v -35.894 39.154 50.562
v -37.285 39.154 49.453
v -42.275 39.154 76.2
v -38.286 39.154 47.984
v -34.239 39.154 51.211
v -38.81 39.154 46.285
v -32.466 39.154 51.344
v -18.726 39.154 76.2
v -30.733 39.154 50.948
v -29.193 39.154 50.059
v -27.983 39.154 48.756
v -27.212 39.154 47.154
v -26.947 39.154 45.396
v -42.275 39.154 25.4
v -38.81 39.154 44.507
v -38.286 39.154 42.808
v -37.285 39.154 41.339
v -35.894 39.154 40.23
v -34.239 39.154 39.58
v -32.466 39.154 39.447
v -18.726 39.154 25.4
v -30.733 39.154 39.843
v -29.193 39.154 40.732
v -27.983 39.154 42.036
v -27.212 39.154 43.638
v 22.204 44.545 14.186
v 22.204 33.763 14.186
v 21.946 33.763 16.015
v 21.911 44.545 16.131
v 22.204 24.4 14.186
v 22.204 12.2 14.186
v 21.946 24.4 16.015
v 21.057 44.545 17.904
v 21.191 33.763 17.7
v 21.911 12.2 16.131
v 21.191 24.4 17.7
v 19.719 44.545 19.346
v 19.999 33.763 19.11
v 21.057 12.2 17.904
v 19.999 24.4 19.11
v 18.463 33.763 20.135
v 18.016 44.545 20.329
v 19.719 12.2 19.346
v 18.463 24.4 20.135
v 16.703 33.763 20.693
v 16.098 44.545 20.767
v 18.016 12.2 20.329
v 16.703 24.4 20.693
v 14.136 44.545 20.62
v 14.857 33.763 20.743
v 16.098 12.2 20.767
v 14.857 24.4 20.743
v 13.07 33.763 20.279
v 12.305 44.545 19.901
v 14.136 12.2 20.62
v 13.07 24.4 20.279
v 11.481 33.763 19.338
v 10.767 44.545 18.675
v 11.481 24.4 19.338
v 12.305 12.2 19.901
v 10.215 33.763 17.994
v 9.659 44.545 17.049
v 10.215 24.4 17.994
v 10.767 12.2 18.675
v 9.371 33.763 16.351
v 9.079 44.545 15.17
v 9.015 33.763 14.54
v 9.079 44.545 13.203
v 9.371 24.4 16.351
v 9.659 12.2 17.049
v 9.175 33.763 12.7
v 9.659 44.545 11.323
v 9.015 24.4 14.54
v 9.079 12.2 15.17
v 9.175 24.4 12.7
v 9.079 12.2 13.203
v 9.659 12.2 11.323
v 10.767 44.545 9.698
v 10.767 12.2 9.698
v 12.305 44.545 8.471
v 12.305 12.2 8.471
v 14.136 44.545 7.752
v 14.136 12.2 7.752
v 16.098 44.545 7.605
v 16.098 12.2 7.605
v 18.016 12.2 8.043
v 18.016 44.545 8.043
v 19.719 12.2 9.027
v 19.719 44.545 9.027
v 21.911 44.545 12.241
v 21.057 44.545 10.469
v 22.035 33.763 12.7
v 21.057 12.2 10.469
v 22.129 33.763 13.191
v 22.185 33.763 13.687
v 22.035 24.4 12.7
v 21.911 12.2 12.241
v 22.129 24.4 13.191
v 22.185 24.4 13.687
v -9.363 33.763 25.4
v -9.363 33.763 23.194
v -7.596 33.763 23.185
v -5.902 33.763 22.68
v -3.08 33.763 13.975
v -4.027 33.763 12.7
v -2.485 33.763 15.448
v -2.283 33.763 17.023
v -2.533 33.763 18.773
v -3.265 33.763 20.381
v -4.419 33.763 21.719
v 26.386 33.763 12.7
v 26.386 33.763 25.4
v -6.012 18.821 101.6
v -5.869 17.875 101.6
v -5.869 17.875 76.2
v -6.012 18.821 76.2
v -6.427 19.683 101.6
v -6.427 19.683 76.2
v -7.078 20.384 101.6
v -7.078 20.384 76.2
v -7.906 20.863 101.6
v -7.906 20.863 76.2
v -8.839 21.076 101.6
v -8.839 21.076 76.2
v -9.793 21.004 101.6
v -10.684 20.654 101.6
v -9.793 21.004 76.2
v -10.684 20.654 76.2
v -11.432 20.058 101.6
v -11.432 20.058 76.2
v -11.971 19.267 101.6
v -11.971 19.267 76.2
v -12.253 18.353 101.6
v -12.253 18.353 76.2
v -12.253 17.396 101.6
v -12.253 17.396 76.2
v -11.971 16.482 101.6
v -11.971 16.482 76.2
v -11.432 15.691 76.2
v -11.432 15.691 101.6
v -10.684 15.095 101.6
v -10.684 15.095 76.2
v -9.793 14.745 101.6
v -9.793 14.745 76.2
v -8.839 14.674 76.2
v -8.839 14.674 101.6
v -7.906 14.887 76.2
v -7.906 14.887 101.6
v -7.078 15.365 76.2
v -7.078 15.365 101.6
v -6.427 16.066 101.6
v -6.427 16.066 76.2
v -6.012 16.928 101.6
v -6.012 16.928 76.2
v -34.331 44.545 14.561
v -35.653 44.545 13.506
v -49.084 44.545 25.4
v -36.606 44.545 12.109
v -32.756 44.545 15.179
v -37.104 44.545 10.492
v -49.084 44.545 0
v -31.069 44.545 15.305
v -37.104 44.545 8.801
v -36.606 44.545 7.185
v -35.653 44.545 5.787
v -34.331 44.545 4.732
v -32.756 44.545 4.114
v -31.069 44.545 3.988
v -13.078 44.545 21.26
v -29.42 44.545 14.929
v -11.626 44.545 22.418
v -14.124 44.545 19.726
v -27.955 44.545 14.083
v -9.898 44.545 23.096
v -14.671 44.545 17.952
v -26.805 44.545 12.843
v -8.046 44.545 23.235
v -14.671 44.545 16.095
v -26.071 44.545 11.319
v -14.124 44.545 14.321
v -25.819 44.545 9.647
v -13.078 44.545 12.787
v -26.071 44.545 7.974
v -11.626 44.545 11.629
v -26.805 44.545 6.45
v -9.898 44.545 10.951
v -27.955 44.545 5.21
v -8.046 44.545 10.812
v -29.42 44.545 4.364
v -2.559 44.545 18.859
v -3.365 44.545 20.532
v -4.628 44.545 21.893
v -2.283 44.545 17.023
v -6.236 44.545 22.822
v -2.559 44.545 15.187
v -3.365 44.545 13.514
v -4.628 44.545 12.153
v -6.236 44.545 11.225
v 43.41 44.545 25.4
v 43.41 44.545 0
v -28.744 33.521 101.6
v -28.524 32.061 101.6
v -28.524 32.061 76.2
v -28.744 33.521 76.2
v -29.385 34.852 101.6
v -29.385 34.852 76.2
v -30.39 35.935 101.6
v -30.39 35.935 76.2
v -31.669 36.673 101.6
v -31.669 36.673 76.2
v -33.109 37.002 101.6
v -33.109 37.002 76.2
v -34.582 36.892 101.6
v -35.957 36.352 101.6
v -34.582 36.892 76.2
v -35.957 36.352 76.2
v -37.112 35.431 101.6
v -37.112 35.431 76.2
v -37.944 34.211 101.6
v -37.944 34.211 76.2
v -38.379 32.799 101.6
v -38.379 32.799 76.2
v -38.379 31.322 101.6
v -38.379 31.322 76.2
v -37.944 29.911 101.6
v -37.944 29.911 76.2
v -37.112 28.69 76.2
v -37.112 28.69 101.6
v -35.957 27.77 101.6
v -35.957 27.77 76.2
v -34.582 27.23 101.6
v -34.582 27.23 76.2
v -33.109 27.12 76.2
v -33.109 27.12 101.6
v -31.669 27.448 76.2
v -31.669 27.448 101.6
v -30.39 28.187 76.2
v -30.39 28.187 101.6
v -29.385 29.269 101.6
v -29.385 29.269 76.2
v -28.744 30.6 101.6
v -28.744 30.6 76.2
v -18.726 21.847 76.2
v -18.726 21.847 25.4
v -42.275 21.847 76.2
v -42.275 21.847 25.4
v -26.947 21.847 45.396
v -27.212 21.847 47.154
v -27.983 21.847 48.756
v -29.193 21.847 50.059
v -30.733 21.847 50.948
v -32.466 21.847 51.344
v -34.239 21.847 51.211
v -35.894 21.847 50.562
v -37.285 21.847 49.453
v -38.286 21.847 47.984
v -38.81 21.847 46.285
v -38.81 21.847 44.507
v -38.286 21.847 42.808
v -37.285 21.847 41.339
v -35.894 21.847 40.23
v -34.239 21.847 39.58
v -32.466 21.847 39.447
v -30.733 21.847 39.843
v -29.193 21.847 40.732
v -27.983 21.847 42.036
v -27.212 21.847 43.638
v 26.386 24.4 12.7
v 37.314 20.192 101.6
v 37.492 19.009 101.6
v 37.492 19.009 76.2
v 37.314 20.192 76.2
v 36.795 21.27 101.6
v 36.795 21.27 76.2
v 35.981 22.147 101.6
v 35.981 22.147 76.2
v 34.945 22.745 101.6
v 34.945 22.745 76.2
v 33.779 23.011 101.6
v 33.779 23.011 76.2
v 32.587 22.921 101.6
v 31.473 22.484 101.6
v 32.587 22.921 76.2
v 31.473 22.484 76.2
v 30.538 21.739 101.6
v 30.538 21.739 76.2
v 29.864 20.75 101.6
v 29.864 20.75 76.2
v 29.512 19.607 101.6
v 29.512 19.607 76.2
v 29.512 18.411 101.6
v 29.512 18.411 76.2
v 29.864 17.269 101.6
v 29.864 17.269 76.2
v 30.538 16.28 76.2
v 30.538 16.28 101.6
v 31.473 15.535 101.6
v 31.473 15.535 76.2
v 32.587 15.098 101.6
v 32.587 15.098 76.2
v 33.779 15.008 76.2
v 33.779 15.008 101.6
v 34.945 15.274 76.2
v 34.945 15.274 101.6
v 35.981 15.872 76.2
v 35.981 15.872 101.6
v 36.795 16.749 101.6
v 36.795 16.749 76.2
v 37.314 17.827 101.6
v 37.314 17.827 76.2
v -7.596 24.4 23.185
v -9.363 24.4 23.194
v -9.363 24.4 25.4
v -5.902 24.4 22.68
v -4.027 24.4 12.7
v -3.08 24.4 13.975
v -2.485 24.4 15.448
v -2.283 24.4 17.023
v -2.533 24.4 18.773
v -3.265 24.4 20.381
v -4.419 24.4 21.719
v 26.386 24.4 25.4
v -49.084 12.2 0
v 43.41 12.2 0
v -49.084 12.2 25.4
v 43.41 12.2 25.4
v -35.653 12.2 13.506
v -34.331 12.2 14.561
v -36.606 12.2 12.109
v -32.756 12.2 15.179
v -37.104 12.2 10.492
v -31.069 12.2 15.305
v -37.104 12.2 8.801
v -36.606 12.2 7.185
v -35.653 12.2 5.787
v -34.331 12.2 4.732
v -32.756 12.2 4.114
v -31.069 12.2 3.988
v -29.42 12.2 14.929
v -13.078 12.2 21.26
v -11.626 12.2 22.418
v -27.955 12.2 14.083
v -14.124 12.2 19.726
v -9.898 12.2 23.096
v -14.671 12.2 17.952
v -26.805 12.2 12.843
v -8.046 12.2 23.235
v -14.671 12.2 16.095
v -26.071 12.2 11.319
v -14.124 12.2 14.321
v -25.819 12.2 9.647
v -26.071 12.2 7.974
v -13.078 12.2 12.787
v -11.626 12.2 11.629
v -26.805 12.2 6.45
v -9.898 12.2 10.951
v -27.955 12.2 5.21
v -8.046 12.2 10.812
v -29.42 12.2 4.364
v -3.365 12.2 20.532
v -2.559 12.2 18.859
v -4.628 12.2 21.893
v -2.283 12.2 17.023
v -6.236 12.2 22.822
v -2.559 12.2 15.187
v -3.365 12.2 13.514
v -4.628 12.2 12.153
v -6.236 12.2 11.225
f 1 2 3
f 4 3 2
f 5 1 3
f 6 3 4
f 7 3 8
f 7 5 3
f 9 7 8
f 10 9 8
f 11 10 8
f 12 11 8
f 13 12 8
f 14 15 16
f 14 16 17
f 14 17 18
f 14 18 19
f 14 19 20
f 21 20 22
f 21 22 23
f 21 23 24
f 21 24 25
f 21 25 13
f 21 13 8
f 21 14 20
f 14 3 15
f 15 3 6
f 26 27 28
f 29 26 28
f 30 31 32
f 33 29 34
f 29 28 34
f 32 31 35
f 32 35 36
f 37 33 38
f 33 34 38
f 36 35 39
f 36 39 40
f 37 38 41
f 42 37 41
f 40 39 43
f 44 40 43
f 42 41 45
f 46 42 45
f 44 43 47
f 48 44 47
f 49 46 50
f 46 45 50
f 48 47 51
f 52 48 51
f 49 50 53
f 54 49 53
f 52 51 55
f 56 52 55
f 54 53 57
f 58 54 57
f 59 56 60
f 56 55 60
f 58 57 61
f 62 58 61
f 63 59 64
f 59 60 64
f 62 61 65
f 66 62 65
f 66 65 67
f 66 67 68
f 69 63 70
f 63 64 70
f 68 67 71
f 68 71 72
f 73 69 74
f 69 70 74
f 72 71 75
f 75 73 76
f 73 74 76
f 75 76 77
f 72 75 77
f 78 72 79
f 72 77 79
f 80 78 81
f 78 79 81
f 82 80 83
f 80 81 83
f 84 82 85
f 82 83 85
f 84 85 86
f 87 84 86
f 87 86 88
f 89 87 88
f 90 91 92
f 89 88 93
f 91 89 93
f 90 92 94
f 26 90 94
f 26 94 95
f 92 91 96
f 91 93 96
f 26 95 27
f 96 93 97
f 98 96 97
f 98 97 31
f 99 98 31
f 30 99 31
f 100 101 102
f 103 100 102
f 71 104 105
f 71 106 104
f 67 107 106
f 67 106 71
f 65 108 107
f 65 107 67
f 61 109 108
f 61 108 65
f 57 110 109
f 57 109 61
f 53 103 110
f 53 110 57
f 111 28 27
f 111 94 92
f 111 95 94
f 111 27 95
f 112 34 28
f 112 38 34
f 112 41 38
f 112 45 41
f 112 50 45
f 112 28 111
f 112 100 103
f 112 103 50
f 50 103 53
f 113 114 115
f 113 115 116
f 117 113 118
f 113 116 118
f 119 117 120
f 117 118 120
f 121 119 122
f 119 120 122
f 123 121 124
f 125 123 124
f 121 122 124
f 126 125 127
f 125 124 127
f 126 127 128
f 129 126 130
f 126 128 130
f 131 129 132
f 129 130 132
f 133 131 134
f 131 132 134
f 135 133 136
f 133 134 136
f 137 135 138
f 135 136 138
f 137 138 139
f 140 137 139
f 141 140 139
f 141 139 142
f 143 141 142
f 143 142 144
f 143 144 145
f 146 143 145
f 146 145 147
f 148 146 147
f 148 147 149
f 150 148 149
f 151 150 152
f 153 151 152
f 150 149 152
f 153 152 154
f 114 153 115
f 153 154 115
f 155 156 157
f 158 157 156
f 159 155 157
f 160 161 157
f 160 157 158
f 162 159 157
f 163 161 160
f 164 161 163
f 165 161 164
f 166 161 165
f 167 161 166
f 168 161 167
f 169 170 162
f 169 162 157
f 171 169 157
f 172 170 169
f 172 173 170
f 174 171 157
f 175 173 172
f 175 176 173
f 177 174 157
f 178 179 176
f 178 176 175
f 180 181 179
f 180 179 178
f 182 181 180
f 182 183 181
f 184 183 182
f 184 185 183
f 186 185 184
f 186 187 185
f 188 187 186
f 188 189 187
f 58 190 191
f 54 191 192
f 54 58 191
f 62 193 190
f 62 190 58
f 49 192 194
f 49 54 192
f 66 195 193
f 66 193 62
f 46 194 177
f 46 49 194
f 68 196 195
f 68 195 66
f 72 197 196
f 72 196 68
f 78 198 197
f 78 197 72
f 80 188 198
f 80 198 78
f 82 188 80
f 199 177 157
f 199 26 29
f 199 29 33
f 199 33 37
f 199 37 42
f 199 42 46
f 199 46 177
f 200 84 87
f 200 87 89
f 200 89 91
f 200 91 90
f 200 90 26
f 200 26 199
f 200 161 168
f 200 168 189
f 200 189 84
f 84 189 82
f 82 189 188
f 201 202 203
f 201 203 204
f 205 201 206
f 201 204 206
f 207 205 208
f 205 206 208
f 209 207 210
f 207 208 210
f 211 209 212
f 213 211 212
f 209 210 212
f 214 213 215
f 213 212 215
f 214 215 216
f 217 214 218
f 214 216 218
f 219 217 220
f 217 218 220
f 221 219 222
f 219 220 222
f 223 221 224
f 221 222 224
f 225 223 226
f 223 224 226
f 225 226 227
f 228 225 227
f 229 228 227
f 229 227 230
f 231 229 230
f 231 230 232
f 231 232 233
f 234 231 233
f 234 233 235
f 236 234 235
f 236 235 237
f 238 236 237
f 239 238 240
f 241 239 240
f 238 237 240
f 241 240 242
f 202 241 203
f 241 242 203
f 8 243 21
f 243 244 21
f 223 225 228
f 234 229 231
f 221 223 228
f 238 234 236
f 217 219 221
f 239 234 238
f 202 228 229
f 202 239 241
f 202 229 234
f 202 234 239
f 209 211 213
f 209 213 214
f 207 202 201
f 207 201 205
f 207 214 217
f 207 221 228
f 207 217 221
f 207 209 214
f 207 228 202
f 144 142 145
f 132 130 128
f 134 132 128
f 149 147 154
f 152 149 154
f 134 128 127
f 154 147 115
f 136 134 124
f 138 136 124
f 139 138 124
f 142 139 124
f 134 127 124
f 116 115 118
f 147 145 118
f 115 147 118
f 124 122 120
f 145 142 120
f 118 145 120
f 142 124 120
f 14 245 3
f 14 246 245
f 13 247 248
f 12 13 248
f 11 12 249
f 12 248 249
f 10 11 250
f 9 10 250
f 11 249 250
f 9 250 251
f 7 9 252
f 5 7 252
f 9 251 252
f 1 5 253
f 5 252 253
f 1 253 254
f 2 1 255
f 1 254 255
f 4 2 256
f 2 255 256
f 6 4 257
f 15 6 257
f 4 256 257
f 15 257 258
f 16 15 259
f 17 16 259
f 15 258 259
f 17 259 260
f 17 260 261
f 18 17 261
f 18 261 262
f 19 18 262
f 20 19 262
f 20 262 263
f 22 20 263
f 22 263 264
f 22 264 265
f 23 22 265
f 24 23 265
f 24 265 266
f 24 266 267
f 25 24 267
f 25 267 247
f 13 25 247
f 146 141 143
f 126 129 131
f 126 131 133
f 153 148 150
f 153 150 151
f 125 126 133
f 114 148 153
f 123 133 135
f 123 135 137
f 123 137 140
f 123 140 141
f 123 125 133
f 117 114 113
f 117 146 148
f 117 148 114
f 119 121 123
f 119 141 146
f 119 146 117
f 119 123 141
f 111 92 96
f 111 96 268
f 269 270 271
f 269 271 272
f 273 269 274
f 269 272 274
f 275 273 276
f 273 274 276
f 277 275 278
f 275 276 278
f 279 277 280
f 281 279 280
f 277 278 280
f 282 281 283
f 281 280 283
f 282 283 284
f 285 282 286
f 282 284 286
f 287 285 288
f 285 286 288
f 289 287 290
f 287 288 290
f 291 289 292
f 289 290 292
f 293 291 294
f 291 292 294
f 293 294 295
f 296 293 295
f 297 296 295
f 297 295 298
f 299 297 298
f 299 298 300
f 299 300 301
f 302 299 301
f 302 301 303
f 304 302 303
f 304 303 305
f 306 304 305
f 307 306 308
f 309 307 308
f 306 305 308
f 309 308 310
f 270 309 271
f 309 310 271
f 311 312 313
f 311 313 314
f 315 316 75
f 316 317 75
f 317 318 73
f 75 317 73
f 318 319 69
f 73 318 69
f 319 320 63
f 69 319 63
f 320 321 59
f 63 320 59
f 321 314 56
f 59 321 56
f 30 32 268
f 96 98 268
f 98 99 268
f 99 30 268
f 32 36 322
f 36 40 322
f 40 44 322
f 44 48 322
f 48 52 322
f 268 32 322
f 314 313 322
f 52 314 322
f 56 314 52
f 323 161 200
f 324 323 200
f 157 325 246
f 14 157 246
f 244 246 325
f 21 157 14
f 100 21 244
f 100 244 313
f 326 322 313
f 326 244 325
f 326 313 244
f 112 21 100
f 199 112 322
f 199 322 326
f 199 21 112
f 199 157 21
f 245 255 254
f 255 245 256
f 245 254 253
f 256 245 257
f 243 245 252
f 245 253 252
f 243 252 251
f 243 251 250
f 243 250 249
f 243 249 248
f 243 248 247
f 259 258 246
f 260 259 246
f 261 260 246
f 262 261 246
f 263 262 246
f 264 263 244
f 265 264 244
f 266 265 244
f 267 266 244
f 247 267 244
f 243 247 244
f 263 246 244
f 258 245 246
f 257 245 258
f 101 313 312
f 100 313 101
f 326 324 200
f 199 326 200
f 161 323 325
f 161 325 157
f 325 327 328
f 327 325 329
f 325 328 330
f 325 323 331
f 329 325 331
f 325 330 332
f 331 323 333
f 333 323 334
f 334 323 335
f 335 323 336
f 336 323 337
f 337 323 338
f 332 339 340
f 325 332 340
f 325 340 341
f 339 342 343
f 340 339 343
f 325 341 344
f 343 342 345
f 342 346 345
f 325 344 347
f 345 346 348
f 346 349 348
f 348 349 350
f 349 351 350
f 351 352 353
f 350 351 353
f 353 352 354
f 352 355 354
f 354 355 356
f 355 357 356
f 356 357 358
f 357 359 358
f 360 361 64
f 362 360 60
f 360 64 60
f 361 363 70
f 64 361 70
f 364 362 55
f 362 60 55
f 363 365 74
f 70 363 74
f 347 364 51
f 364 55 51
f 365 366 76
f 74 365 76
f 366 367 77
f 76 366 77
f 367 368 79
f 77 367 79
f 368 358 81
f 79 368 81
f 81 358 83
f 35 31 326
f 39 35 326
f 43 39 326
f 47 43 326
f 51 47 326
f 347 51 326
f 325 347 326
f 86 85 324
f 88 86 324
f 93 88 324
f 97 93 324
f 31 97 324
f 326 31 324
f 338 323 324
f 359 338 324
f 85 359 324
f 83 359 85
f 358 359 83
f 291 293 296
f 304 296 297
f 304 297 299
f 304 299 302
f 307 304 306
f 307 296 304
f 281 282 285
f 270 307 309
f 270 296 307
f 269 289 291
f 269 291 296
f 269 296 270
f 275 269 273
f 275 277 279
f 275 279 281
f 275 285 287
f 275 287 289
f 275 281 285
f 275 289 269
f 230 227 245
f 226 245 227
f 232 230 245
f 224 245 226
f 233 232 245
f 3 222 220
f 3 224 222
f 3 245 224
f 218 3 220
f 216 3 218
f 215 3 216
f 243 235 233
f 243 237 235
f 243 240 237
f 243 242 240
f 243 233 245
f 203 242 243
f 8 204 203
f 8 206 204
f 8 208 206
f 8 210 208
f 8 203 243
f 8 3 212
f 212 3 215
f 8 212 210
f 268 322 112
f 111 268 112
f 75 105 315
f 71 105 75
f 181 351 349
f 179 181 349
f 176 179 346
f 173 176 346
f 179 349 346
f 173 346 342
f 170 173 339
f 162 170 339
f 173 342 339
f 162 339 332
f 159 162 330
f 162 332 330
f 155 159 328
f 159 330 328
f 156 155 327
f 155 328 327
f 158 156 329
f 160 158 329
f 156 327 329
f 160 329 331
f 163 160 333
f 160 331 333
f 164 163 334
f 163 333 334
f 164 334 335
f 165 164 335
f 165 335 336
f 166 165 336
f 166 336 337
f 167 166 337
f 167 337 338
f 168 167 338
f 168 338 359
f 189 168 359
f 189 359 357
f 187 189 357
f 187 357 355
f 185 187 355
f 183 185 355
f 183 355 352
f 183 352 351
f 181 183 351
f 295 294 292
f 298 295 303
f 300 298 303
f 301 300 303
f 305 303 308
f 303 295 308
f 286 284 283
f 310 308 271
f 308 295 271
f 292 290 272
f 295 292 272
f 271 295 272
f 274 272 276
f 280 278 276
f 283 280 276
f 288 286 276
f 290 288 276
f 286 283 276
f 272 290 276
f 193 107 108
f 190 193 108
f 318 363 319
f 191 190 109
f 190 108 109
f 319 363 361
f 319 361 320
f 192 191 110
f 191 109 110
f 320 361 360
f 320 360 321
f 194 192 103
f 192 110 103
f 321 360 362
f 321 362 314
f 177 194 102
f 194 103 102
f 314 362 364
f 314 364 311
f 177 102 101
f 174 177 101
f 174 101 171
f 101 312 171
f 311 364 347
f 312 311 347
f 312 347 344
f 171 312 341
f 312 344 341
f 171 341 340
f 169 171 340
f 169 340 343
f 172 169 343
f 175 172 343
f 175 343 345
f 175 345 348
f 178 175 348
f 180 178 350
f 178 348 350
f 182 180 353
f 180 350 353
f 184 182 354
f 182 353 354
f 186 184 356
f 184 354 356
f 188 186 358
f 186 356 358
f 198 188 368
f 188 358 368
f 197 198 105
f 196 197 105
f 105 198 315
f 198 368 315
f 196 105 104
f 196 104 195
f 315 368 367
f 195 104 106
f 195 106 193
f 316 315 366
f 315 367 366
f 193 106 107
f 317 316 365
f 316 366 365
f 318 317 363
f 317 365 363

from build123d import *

# Parameters (mm, degrees)
F0_W      = 92.4938283861
F0_H      = 32.3444707319
F1_DEPTH  = 25.4
F2_W      = 23.5490426421
F2_H      = 17.3071268946
F3_DEPTH  = 25.4
F4_DEPTH  = 25.4
F5_W      = 35.7491457835
F5_H      = 9.3628708273
F6_DEPTH  = 12.7
F7_R      = 6.2290064901
F8_DEPTH  = 32.3454707319
F9_R      = 5.9649434691
F9_R_2    = 5.6744676083
F9_R_3    = 6.5992382135
F10_DEPTH = 32.3454707319
F11_R     = 4.9550177223
F12_DEPTH = 25.4
F11_R_2   = 3.2099639101
F11_R_3   = 4.0124537352


with BuildPart() as f1:
    # F0 (on Top) → F1 (new body)
    with BuildSketch(Plane.XY):
        with Locations((-2.837235108, 28.3723422326)):
            Rectangle(F0_W, F0_H)
    extrude(amount=F1_DEPTH)

    # F2 (on face) → F3 (join)
    with BuildSketch(Plane.XY.offset(25.4)):
        with Locations((-30.500266701, 30.5002657697)):
            Rectangle(F2_W, F2_H)
    extrude(amount=F3_DEPTH)

    # F4 (add): a face of the model
    f4_faces = [f1.faces().sort_by_distance(p)[0] for p in [
        (-30.500266701, 30.5002657697, 50.8),
    ]]
    extrude(f4_faces, amount=F4_DEPTH)

    # F5 (on face) → F6 (cut)
    with BuildSketch(Plane.XY.offset(25.4)):
        with Locations((8.5117011331, 29.081649147)):
            Rectangle(F5_W, F5_H)
    extrude(amount=-F6_DEPTH, mode=Mode.SUBTRACT)

    # F7 (on face) → F8 (cut, through all)
    with BuildSketch(Plane.XZ.offset(-12.2001068667)):
        with Locations((-8.5117015988, 17.0234050602)):
            Circle(F7_R)
    extrude(amount=-F8_DEPTH, mode=Mode.SUBTRACT)

    # F9 (on face) → F10 (cut, through all)
    with BuildSketch(Plane.XZ.offset(-12.2001068667)):
        with Locations((-32.9119153321, 45.3957468271)):
            Circle(F9_R)
        with Locations((-31.4932987094, 9.6465954557)):
            Circle(F9_R_2)
        with Locations((15.6047875062, 14.1861708835)):
            Circle(F9_R_3)
    extrude(amount=-F10_DEPTH, mode=Mode.SUBTRACT)

    # F11 (on face) → F12 (join)
    with BuildSketch(Plane.XY.offset(76.2)):
        with Locations((-33.4793627262, 32.0607461035)):
            Circle(F11_R)
    extrude(amount=F12_DEPTH)


with BuildPart() as f12:
    # F11 (on face) → F12, piece 2 (new body)
    with BuildSketch(Plane.XY.offset(76.2)):
        with Locations((-9.0791489929, 17.8745742887)):
            Circle(F11_R_2)
    extrude(amount=F12_DEPTH)


with BuildPart() as f12b:
    # F11 (on face) → F12, piece 3 (new body)
    with BuildSketch(Plane.XY.offset(76.2)):
        with Locations((33.4793627262, 19.009469077)):
            Circle(F11_R_3)
    extrude(amount=F12_DEPTH)


solid = Compound([f1.part, f12.part, f12b.part])
